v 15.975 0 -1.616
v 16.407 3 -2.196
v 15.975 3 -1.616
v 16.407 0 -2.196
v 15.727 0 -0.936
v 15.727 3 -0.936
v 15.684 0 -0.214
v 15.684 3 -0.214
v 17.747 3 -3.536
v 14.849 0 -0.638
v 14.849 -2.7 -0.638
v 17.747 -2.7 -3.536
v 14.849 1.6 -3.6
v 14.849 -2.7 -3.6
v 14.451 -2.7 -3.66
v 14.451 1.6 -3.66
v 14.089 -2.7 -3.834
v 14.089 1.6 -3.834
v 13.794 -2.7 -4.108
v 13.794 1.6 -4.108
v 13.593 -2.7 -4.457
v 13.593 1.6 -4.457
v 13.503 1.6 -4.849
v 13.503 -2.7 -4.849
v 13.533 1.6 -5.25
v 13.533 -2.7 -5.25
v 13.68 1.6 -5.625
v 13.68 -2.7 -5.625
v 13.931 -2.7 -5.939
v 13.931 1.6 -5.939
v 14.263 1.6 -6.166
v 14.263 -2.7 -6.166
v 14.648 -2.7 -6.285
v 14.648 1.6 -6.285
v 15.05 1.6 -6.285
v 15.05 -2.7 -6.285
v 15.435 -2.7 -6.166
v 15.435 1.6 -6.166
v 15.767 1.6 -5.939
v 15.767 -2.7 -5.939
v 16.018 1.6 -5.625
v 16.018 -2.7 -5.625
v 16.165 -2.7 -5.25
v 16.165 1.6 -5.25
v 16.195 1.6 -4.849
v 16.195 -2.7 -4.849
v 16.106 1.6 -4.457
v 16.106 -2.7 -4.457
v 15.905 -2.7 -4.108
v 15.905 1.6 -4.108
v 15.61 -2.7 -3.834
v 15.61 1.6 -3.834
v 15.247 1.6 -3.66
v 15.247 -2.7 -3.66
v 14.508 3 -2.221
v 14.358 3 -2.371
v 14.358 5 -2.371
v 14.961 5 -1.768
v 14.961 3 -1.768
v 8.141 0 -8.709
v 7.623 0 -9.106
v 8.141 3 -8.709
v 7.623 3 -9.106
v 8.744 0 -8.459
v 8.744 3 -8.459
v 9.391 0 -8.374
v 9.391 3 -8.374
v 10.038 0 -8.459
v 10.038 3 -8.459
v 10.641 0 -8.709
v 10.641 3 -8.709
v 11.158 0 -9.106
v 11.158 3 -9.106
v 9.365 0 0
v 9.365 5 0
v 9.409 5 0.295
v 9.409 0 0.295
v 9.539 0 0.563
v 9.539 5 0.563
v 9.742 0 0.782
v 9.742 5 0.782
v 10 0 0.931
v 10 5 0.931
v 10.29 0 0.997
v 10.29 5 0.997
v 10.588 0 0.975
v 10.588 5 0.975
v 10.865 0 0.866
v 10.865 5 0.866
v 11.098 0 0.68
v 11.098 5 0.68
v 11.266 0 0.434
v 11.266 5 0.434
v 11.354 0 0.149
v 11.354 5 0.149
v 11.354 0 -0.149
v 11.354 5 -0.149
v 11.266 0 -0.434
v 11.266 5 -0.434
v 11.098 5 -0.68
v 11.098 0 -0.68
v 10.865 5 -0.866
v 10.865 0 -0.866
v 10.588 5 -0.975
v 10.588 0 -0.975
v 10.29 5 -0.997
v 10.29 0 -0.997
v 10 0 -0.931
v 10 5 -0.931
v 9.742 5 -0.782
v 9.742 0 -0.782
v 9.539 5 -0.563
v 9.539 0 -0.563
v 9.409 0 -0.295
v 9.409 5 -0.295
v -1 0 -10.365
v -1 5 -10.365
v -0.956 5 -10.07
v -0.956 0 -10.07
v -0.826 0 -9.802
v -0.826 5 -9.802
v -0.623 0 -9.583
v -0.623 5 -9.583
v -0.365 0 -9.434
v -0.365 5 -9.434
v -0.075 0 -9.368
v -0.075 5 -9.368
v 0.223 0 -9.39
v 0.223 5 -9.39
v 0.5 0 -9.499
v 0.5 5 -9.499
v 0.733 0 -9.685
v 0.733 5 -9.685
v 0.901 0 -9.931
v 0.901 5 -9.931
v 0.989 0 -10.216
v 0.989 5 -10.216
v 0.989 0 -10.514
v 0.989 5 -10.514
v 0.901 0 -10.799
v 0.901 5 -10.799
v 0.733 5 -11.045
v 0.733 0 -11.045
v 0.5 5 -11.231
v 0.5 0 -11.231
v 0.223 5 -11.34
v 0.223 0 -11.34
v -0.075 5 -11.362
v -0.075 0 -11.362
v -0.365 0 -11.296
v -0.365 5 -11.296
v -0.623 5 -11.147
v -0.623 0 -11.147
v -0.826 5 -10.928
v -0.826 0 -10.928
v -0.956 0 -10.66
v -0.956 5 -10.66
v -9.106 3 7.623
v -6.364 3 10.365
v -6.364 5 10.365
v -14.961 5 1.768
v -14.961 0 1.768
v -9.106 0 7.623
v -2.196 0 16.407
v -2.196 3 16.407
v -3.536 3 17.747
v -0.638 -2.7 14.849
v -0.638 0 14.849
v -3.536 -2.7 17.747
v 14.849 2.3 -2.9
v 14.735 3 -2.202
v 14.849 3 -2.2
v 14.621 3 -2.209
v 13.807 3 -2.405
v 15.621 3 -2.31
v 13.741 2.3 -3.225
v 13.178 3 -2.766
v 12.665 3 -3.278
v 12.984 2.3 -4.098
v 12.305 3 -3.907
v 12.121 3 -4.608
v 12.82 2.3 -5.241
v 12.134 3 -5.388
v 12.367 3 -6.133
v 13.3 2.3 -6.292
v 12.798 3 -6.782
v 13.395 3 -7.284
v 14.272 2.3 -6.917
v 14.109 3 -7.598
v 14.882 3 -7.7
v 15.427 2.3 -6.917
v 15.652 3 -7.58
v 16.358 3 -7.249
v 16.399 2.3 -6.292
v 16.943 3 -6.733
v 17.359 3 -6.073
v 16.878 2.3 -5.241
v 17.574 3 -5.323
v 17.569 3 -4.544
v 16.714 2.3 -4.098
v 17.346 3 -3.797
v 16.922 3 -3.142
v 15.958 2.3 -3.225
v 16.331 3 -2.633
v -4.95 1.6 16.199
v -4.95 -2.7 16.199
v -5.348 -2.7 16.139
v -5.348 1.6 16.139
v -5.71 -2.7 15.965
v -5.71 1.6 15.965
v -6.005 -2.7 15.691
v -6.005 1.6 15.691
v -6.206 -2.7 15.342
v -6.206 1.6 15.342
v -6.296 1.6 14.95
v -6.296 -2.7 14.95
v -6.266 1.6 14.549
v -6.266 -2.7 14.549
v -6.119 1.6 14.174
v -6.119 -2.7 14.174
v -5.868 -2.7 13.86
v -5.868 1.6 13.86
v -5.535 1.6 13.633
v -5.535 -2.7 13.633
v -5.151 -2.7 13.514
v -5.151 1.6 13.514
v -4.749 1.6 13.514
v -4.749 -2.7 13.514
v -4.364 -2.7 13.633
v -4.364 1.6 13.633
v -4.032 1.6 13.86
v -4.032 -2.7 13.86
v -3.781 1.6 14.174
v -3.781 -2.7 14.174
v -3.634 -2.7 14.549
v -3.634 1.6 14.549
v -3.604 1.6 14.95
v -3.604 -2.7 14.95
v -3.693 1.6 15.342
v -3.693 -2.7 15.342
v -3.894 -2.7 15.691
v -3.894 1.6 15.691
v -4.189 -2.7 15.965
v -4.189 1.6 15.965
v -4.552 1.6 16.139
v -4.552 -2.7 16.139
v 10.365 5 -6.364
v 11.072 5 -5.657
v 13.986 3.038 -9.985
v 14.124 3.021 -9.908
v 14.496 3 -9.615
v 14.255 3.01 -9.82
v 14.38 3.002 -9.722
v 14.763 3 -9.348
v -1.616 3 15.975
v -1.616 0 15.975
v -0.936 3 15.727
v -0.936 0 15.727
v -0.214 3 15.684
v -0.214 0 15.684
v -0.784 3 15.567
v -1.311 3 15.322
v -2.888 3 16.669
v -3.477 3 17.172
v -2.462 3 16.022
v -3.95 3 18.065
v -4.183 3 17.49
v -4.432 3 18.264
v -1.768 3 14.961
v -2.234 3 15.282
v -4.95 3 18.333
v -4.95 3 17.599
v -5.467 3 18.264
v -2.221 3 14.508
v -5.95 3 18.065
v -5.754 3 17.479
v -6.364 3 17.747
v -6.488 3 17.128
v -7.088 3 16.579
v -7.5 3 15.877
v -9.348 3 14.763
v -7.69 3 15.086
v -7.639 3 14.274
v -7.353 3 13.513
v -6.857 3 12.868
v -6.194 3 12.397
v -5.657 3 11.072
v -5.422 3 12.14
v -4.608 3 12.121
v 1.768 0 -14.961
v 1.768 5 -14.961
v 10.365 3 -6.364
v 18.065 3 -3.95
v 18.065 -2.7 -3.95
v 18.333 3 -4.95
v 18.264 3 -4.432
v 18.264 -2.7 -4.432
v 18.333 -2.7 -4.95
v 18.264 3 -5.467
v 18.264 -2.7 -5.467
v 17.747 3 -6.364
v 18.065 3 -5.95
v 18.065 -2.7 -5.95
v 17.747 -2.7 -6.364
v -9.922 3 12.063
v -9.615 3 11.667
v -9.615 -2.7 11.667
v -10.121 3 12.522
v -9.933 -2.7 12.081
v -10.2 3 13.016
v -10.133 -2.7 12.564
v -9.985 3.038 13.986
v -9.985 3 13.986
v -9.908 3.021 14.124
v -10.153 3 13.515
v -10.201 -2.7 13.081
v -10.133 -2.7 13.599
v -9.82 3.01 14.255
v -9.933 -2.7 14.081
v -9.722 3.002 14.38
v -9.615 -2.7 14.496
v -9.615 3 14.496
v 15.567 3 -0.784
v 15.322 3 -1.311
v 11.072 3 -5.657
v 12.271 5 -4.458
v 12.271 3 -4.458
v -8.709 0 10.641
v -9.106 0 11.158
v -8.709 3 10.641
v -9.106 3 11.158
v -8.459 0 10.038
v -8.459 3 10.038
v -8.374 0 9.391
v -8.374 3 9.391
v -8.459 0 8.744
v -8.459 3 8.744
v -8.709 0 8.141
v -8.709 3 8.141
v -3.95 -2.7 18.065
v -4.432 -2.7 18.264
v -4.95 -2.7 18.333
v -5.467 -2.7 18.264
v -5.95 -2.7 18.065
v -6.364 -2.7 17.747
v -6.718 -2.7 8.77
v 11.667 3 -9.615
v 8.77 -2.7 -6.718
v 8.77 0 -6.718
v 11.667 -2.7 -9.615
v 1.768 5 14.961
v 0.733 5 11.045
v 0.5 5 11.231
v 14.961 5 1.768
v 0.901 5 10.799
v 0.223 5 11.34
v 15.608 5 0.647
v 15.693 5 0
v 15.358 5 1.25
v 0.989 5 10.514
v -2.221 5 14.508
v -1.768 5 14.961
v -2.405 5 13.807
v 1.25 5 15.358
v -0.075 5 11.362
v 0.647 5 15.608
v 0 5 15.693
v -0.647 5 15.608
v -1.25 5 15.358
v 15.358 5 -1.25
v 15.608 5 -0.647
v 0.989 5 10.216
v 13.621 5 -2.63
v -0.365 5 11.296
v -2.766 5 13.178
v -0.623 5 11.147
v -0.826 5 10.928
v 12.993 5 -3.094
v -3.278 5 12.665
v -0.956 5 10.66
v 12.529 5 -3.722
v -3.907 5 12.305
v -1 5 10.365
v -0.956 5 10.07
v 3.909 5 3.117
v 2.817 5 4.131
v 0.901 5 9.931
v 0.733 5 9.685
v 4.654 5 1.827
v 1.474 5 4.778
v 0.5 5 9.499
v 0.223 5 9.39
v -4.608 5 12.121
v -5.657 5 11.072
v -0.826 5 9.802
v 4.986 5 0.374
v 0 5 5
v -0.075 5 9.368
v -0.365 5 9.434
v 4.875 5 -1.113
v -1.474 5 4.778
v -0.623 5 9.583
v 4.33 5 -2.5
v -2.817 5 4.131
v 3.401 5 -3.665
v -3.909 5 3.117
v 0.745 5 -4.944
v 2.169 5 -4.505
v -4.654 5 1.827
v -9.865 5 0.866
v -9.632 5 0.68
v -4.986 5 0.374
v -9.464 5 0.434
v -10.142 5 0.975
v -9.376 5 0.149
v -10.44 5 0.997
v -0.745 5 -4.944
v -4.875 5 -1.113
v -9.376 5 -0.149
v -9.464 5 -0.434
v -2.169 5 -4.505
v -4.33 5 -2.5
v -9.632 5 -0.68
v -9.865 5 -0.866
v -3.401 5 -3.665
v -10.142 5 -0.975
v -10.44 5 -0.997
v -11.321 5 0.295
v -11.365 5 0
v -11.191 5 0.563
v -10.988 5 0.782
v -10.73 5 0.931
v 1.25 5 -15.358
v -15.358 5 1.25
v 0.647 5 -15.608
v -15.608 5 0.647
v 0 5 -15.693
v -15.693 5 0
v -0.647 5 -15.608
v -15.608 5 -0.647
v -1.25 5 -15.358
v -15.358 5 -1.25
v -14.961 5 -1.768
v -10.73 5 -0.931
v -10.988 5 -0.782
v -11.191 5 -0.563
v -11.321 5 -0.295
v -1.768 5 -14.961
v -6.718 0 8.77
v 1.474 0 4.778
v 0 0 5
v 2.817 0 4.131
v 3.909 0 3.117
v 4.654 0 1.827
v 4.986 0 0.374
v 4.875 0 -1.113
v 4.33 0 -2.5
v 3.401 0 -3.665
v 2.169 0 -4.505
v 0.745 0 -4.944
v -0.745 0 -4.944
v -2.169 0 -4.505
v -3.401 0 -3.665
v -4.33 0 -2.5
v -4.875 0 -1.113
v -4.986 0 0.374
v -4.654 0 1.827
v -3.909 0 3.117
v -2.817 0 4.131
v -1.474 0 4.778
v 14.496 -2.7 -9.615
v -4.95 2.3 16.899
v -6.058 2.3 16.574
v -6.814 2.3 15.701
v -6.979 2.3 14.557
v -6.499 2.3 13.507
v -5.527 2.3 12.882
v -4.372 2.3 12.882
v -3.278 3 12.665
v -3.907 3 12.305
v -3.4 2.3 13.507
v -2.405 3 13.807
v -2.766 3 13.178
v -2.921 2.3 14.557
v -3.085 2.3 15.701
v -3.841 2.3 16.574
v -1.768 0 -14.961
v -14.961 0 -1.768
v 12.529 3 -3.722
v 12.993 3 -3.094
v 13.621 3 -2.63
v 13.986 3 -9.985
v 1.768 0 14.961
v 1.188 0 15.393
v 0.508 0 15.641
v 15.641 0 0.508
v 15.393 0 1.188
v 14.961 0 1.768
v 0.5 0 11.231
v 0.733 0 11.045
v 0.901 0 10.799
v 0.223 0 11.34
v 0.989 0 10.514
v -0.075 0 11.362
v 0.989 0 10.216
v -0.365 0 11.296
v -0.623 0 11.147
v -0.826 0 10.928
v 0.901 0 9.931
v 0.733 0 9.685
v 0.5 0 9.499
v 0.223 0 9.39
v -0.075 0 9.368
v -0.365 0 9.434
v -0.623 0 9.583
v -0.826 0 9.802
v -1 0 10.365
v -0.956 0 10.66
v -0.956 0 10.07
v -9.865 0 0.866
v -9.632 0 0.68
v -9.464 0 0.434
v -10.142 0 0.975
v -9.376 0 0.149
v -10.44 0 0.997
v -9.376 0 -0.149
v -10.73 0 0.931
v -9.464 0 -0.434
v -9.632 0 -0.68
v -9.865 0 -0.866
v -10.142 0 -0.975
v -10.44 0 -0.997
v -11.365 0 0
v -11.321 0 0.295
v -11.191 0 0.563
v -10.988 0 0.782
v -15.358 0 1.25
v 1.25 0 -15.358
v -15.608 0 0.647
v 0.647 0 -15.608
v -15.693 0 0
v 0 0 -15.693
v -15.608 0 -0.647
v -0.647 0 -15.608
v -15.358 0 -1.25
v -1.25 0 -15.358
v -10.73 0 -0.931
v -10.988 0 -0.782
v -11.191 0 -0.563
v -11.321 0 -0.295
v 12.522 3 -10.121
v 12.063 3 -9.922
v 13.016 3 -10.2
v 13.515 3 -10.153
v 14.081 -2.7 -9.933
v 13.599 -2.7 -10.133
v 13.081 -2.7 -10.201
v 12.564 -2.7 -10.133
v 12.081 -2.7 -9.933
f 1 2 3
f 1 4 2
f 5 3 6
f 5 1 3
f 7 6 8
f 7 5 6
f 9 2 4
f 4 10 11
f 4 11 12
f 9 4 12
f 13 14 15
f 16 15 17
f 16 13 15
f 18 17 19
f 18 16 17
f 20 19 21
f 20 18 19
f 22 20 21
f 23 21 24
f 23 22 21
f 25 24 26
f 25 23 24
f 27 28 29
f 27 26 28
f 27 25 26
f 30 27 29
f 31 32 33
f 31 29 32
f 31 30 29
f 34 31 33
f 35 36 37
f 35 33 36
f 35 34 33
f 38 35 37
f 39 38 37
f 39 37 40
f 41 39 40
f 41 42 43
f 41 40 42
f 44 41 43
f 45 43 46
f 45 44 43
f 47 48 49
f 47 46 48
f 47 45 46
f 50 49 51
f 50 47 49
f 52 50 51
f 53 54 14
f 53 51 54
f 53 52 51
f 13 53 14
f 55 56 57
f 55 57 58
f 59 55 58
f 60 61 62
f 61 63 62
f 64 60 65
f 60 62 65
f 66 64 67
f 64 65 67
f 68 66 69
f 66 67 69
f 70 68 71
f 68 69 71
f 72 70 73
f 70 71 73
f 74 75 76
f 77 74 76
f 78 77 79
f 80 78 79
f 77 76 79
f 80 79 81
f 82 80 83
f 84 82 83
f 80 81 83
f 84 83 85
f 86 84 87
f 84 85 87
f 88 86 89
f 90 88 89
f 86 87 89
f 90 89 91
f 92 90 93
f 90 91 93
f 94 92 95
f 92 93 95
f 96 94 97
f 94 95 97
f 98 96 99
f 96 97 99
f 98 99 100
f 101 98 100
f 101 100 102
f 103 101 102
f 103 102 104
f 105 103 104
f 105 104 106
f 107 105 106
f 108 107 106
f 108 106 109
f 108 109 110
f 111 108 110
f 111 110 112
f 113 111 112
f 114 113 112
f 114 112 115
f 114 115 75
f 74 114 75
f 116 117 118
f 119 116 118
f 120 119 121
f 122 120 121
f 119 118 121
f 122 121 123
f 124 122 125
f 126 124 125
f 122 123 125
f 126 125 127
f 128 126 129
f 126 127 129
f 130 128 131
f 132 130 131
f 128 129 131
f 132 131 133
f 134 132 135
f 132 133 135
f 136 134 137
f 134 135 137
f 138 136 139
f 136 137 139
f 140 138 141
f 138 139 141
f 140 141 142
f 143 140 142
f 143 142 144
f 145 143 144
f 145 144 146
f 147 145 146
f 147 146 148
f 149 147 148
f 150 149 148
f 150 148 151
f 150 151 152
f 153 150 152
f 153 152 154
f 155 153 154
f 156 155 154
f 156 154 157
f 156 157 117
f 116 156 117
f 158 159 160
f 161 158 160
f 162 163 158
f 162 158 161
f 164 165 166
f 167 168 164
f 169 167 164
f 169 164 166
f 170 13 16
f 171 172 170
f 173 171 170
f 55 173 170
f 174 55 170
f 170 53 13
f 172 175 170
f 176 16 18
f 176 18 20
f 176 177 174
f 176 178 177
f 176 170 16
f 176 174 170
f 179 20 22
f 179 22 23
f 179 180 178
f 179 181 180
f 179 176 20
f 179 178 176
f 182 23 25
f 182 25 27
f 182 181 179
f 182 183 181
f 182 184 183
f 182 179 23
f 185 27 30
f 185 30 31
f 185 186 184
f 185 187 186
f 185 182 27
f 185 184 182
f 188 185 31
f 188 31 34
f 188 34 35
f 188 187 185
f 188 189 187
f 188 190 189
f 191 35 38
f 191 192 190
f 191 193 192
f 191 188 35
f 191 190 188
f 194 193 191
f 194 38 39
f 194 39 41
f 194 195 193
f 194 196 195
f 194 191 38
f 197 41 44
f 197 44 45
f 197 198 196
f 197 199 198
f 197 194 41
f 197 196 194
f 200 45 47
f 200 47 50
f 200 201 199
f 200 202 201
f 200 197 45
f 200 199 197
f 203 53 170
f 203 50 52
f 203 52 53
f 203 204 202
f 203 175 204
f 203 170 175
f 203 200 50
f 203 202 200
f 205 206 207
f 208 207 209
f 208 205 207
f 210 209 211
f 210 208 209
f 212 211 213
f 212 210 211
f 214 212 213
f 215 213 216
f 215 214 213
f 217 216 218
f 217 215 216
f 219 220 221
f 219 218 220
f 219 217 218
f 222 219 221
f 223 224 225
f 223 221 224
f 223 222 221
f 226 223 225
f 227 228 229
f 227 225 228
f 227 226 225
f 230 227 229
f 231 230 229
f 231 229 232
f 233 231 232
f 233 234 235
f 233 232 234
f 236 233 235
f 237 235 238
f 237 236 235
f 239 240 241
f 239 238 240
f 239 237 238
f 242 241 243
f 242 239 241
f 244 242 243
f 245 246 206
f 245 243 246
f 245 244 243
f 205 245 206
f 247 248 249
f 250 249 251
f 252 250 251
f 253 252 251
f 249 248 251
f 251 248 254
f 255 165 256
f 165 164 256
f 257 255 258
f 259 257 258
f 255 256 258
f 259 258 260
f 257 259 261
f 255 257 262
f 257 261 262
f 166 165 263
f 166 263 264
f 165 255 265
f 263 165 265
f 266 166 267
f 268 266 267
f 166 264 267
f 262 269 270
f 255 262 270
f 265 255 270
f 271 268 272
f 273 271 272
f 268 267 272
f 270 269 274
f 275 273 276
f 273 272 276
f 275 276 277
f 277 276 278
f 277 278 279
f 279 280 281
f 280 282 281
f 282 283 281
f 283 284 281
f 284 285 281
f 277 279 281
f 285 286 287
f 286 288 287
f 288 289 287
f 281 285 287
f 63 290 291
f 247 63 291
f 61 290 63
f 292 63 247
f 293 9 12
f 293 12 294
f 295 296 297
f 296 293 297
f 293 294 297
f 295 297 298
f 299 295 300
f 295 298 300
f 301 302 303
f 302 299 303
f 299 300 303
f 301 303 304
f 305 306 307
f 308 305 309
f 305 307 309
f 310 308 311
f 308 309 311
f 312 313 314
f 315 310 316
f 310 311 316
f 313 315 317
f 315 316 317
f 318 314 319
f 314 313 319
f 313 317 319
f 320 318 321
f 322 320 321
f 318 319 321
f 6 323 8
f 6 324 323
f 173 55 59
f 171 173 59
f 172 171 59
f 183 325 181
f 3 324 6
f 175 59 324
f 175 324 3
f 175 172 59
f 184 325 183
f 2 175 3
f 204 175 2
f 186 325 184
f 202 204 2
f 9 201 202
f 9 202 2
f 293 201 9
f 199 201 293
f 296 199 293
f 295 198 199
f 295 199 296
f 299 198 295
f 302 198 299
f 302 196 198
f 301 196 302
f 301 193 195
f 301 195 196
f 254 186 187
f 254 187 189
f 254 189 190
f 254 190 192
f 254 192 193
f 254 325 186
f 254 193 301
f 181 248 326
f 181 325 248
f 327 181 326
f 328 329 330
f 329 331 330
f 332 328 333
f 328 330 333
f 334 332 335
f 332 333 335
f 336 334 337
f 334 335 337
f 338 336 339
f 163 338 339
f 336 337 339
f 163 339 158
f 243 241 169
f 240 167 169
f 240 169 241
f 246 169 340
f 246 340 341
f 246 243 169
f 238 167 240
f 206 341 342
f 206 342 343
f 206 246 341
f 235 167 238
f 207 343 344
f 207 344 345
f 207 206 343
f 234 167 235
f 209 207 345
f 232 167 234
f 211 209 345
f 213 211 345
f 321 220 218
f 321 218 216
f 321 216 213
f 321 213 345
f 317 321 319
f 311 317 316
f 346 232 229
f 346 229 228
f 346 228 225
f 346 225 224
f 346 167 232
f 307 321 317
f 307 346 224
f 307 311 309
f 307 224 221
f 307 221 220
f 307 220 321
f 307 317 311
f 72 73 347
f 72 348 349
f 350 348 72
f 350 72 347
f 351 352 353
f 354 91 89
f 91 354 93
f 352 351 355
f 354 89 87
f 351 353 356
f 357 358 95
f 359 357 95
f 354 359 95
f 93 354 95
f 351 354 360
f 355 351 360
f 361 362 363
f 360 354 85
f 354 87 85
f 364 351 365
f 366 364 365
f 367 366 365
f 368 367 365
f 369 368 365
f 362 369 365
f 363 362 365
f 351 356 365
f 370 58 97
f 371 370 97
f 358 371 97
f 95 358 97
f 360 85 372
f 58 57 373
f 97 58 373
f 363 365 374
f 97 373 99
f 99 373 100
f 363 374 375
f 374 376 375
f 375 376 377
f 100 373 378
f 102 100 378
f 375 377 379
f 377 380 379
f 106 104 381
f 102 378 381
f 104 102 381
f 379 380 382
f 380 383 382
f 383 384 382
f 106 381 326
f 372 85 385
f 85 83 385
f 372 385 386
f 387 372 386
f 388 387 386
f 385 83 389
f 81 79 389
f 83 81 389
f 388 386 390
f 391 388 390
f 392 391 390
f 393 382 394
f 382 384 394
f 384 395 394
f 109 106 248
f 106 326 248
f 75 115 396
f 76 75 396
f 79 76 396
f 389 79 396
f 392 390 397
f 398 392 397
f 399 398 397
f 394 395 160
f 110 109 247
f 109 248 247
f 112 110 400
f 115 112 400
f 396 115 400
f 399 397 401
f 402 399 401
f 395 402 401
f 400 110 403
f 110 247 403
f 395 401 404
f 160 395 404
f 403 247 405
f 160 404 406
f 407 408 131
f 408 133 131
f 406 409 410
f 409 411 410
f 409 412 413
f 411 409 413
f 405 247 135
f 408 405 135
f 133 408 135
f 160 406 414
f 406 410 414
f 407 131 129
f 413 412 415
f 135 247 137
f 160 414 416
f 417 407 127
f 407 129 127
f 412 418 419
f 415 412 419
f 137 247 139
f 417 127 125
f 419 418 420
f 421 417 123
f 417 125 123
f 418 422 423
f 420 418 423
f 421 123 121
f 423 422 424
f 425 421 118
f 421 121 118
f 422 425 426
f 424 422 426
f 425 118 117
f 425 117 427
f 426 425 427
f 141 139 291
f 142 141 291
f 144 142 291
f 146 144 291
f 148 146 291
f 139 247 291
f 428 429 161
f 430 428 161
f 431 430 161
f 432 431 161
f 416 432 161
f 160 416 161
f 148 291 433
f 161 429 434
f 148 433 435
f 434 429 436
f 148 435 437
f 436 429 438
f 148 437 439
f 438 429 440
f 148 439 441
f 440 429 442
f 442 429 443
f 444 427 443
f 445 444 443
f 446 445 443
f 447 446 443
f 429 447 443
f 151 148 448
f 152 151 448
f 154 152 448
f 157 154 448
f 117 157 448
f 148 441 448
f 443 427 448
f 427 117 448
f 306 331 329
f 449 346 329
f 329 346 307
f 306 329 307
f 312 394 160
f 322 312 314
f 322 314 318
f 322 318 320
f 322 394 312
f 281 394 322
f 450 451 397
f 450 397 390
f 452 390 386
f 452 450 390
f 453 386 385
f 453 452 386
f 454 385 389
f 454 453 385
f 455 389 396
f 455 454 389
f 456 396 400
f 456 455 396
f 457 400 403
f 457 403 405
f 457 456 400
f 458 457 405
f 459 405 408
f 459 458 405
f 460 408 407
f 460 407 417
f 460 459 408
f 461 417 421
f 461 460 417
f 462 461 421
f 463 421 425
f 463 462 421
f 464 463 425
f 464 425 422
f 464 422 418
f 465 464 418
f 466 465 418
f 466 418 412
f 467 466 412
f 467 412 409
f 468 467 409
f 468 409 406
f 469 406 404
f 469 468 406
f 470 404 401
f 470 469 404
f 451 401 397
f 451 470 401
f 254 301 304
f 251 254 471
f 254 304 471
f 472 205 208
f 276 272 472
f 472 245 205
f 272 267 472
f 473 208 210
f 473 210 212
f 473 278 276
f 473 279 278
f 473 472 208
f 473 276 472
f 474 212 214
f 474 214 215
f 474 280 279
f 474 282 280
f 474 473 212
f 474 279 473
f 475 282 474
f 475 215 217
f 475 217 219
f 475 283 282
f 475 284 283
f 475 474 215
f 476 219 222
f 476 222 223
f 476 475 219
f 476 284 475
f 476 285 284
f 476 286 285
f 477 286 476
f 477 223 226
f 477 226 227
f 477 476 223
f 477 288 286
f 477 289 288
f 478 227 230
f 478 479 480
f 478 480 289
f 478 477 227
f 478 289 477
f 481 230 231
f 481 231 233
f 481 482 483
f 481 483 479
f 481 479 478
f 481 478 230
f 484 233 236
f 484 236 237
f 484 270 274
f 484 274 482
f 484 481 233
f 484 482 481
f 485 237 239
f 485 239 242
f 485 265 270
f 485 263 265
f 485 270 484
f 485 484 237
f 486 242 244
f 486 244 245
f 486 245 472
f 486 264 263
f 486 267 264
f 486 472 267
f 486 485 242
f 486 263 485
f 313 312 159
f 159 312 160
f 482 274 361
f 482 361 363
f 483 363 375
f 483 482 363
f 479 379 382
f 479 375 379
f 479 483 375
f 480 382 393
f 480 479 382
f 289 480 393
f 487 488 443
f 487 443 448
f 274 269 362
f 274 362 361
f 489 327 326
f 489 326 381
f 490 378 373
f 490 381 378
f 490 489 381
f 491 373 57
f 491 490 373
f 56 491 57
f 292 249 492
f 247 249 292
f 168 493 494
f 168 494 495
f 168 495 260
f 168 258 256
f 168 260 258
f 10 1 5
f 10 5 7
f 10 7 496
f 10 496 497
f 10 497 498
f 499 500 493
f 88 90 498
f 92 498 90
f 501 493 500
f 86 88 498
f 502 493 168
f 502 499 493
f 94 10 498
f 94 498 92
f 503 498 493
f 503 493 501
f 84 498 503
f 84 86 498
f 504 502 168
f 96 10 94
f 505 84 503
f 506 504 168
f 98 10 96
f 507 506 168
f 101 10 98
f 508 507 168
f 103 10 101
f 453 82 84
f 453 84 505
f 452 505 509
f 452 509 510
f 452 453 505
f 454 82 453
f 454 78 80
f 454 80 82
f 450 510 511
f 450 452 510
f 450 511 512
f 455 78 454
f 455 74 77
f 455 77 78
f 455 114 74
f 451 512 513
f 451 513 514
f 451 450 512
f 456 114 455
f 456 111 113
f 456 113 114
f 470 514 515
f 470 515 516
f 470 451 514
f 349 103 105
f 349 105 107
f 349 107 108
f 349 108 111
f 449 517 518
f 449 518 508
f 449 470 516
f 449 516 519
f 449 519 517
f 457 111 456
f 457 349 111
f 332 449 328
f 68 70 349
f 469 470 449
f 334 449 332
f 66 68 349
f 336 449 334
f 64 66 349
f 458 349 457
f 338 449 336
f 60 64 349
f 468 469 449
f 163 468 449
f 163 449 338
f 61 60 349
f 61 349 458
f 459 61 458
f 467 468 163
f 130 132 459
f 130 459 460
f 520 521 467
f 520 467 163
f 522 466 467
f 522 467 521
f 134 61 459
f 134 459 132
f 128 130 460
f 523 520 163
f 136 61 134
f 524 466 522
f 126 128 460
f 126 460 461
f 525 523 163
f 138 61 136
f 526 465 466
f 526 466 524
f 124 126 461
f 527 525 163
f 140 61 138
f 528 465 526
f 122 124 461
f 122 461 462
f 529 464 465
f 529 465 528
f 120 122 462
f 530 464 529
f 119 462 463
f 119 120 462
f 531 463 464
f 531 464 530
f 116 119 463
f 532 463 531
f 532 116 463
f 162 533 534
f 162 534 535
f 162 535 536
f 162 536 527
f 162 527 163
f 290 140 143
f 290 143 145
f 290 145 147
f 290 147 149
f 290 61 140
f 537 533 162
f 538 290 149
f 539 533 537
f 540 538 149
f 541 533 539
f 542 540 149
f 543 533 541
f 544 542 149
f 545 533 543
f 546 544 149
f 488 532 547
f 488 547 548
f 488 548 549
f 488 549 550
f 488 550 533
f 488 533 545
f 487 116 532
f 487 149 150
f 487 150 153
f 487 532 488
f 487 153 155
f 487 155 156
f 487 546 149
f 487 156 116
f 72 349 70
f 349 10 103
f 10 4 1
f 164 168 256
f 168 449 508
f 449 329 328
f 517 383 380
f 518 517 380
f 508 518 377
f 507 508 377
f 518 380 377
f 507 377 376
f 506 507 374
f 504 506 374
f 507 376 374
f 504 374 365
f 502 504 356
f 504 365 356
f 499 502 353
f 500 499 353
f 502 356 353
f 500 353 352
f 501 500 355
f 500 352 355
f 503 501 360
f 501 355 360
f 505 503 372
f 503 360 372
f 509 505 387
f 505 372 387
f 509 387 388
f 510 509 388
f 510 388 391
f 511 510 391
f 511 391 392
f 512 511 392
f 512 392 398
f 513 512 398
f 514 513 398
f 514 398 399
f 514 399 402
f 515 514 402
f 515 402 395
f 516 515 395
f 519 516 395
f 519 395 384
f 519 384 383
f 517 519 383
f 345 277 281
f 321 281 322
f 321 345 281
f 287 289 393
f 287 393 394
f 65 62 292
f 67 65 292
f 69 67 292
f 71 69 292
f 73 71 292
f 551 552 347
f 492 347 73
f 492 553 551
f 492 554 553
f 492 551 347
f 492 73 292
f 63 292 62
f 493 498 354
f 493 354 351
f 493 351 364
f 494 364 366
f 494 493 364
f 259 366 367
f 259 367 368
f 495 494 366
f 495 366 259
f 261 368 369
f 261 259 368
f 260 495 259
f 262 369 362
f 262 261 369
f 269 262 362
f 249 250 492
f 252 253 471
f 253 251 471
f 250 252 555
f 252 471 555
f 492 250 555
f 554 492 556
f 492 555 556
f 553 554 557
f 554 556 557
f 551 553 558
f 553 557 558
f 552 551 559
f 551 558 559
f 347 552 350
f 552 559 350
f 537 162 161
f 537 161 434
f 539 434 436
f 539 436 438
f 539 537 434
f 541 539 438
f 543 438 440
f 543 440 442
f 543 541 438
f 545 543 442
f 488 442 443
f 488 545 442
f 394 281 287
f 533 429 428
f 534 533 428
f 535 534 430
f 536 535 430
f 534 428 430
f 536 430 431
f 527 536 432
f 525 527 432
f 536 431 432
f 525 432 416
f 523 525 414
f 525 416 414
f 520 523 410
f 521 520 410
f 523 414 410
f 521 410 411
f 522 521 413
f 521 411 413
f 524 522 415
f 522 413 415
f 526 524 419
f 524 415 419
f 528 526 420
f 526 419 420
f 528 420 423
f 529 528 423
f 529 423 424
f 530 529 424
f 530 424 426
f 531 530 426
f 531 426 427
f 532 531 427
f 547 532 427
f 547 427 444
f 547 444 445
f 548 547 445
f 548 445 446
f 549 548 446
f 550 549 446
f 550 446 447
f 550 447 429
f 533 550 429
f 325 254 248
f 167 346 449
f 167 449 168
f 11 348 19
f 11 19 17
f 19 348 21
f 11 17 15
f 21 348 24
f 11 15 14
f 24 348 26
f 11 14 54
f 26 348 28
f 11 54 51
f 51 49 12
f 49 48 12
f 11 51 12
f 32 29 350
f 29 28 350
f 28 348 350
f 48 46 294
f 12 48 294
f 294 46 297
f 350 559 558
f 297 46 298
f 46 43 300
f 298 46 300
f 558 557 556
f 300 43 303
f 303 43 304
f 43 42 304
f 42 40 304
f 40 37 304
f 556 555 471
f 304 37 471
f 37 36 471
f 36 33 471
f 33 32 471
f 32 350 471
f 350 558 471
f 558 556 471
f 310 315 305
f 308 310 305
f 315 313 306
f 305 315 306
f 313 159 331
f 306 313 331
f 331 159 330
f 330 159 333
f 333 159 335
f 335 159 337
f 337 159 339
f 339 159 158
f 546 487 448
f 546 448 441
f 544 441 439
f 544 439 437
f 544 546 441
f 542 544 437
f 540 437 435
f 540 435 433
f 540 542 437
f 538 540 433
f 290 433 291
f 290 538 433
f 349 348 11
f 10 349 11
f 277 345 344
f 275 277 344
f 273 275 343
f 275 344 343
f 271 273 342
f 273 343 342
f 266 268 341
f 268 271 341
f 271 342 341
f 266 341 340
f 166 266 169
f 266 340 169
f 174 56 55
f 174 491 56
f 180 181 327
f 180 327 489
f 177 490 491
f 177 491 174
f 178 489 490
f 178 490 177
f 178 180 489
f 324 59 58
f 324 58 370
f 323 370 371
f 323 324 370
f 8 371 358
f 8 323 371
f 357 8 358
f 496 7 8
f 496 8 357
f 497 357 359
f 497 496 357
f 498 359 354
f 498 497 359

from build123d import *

# Parameters (mm, degrees)
SKETCH1_R                                      = 0.5
SKETCH1_R_2                                    = 5
BOSS_EXTRUDE1_DEPTH                            = 5
SKETCH3_R                                      = 1.3
BOSS_EXTRUDE4_DEPTH                            = 5.7
BOSS_EXTRUDE6_DEPTH                            = 1
FILLET1_R                                      = 2.5
FILLET2_R                                      = 2
F_2_0MM_DOWEL_HOLE1_D                          = 2
F_2_0MM_DOWEL_HOLE1_DEPTH                      = 42.93
F_2_0MM_DOWEL_HOLE1_TIP                        = 0.600860619
SKETCH12_R                                     = 2.75
SKETCH12_R_2                                   = 2.625
CUT_EXTRUDE1_DEPTH                             = 10
CSK_FOR_M2_5_FLAT_HEAD_MACHINE_SCREW1_AT_COUNT = 2
CSK_FOR_M2_5_FLAT_HEAD_MACHINE_SCREW1_AT_PITCH = 28


with BuildPart() as part:
    # Sketch1 → Boss-Extrude1 (new body)
    with BuildSketch(Plane(origin=(0, 0, 0), x_dir=(1, 0, 0), z_dir=(0, 1, 0))):
        with BuildLine():
            Line((1.767766953, 14.961194078), (14.961194078, 1.767766953))
            ThreePointArc((14.961194078, 1.767766953), (15.693427125, 0), (14.961194078, -1.767766953))
            Line((14.961194078, -1.767766953), (1.767766953, -14.961194078))
            ThreePointArc((1.767766953, -14.961194078), (0, -15.693427125), (-1.767766953, -14.961194078))
            Line((-1.767766953, -14.961194078), (-14.961194078, -1.767766953))
            ThreePointArc((-14.961194078, -1.767766953), (-15.693427125, 0), (-14.961194078, 1.767766953))
            Line((-14.961194078, 1.767766953), (-1.767766953, 14.961194078))
            ThreePointArc((-1.767766953, 14.961194078), (0, 15.693427125), (1.767766953, 14.961194078))
        make_face()
        with Locations(Location((0, 10.365, 0), (0, 0, 270))):
            Circle(SKETCH1_R, mode=Mode.SUBTRACT)
        with Locations(Location((0, -10.365, 0), (0, 0, 270))):
            Circle(SKETCH1_R, mode=Mode.SUBTRACT)
        with Locations(Location((10.365, 0, 0), (0, 0, 270))):
            Circle(SKETCH1_R, mode=Mode.SUBTRACT)
        with Locations(Location((-10.365, 0, 0), (0, 0, 270))):
            Circle(SKETCH1_R, mode=Mode.SUBTRACT)
        with Locations(Location((0, 0, 0), (0, 0, 270))):
            Circle(SKETCH1_R_2, mode=Mode.SUBTRACT)
    extrude(amount=BOSS_EXTRUDE1_DEPTH)

    # Sketch3 → Boss-Extrude4 (add)
    # profile 1 of 4: a face of its own
    with BuildSketch(Plane(origin=(0, -2.7, 0), x_dir=(1, 0, 0), z_dir=(0, 1, 0))):
        Polygon((-4.949747468, -10.537489101), (-0.637994164, -14.849242405), (-4.949747468, -19.160995709), (-9.261500772, -14.849242405), align=None)
        with Locations(Location((-4.949747468, -14.849242405, 0), (0, 0, 90))):
            Circle(SKETCH3_R, mode=Mode.SUBTRACT)
    # profile 2 of 4: a face of its own
    with BuildSketch(Plane(origin=(0, -2.7, 0), x_dir=(1, 0, 0), z_dir=(0, 1, 0))):
        Polygon((-6.717514421, -8.769722148), (-11.029267725, -13.081475452), (-9.261500772, -14.849242405), (-4.949747468, -10.537489101), align=None)
    # profile 3 of 4: a face of its own
    with BuildSketch(Plane(origin=(0, -2.7, 0), x_dir=(1, 0, 0), z_dir=(0, 1, 0))):
        Polygon((19.160995709, 4.949747468), (14.849242405, 9.261500772), (10.537489101, 4.949747468), (14.849242405, 0.637994164), align=None)
        with Locations(Location((14.849242405, 4.949747468, 0), (0, 0, 90))):
            Circle(SKETCH3_R, mode=Mode.SUBTRACT)
    # profile 4 of 4: a face of its own
    with BuildSketch(Plane(origin=(0, -2.7, 0), x_dir=(1, 0, 0), z_dir=(0, 1, 0))):
        Polygon((13.081475452, 11.029267725), (14.849242405, 9.261500772), (10.537489101, 4.949747468), (8.769722148, 6.717514421), align=None)
    extrude(amount=BOSS_EXTRUDE4_DEPTH)


with BuildPart() as boss_extrude6_tool:
    # Sketch7 → Boss-Extrude6 (new body)
    with BuildSketch(Plane(origin=(2.707626069, -2.13e-07, 2.707626069), x_dir=(0.7071067811865474, 0, -0.7071067811865478), z_dir=(0.7071067811865467, -5.5755039757469385e-08, 0.7071067811865462))):
        Polygon((11.829161787, 5.00000052), (17.04887, 3.00000056), (11.829161787, 3.00000052), align=None)
        Polygon((-11.829161787, 5.00000052), (-17.04887, 3.00000056), (-11.829161787, 3.00000052), align=None)
    extrude(amount=-BOSS_EXTRUDE6_DEPTH)


with BuildPart() as part_1:
    add(part.part)


with BuildPart() as part_2:
    # Boss-Extrude6: joined with boss_extrude6_tool
    add(part_1.part.fuse(boss_extrude6_tool.part, tol=0.00001))

    # Fillet1
    fillet1_edges = [part_2.edges().sort_by_distance(p)[0] for p in [
        (-7.338376652, 1.5, 9.390584379),
        (-1.184018869, 1.5, 15.395267109),
        (9.390584379, 1.5, -7.338376652),
        (15.395267109, 1.5, -1.184018869),
    ]]
    fillet(fillet1_edges, radius=FILLET1_R)

    # Fillet2
    # the kernel refuses this fillet: 2 mm, written as the material it takes off along each edge
    with BuildSketch(Plane(origin=(-4.949747468, -7.7, 19.160995709), x_dir=(-0.7071067811865471, 0, -0.707106781186548), z_dir=(0, 1, 0)), Plane(origin=(13.081475452, -7.7, -11.029267725), x_dir=(0.7071067811865476, 0, 0.7071067811865476), z_dir=(0, 1, 0))) as fillet2_piece_1:
        with BuildLine():
            CenterArc((FILLET2_R, -FILLET2_R), FILLET2_R, 90, 90)
            Line((0, -FILLET2_R), (0, 0))
            Line((0, 0), (FILLET2_R, 0))
        make_face()
    extrude(amount=15.7, mode=Mode.SUBTRACT)
    with BuildSketch(Plane(origin=(-11.029267725, -7.7, 13.081475452), x_dir=(0.707106781186547, 0, 0.7071067811865479), z_dir=(0, 1, 0)), Plane(origin=(19.160995709, -7.7, -4.949747468), x_dir=(-0.7071067811865482, 0, -0.7071067811865469), z_dir=(0, 1, 0))) as fillet2_piece_2:
        with BuildLine():
            CenterArc((FILLET2_R, FILLET2_R), FILLET2_R, 180, 90)
            Line((0, FILLET2_R), (0, 0))
            Line((0, 0), (FILLET2_R, 0))
        make_face()
    extrude(amount=15.7, mode=Mode.SUBTRACT)

    # Ø2.0mm Dowel Hole1
    with Locations(Plane.XZ):
        with Locations((0, 10.365), (10.365, 0), (-10.365, 0), (0, -10.365)):
            Hole(F_2_0MM_DOWEL_HOLE1_D / 2, depth=F_2_0MM_DOWEL_HOLE1_DEPTH)
            with Locations((0, 0, -(F_2_0MM_DOWEL_HOLE1_DEPTH + F_2_0MM_DOWEL_HOLE1_TIP / 2))):  # 118° drill point
                Cone(0, F_2_0MM_DOWEL_HOLE1_D / 2, F_2_0MM_DOWEL_HOLE1_TIP, mode=Mode.SUBTRACT)

    # Sketch12 → Cut-Extrude1 (cut)
    with BuildSketch(Plane(origin=(0, 3, 0), x_dir=(1, 0, 0), z_dir=(0, 1, 0))):
        with Locations((-4.949747468, -14.849242405)):
            Circle(SKETCH12_R)
        with Locations((14.849242405, 4.949747468)):
            Circle(SKETCH12_R_2)
    extrude(amount=CUT_EXTRUDE1_DEPTH, mode=Mode.SUBTRACT)

    # Sketch13 → CSK for M2.5 Flat Head Machine Screw1 (revolve, cut)
    with BuildSketch(Plane(origin=(-4.949747468, 3, 14.849242405), x_dir=(0, 0, 1), z_dir=(1, 0, 0))):
        Polygon((0, 0), (0, 43.741161836), (1.35, 42.93), (1.35, 1.4), (2.75, 0), align=None)
    csk_for_m2_5_flat_head_machine_screw1 = revolve(axis=Axis((-4.949747468, 9.35, 14.849242405), (0, -1, 0)), mode=Mode.SUBTRACT)

    # CSK for M2.5 Flat Head Machine Screw1 at: CSK for M2.5 Flat Head Machine Screw1 ×2
    with Locations(*[Vector(0.7071067811865477, 0, -0.7071067811865475) * (i * CSK_FOR_M2_5_FLAT_HEAD_MACHINE_SCREW1_AT_PITCH) for i in range(1, CSK_FOR_M2_5_FLAT_HEAD_MACHINE_SCREW1_AT_COUNT)]):
        add(csk_for_m2_5_flat_head_machine_screw1, mode=Mode.SUBTRACT)


solid = part_2.part
